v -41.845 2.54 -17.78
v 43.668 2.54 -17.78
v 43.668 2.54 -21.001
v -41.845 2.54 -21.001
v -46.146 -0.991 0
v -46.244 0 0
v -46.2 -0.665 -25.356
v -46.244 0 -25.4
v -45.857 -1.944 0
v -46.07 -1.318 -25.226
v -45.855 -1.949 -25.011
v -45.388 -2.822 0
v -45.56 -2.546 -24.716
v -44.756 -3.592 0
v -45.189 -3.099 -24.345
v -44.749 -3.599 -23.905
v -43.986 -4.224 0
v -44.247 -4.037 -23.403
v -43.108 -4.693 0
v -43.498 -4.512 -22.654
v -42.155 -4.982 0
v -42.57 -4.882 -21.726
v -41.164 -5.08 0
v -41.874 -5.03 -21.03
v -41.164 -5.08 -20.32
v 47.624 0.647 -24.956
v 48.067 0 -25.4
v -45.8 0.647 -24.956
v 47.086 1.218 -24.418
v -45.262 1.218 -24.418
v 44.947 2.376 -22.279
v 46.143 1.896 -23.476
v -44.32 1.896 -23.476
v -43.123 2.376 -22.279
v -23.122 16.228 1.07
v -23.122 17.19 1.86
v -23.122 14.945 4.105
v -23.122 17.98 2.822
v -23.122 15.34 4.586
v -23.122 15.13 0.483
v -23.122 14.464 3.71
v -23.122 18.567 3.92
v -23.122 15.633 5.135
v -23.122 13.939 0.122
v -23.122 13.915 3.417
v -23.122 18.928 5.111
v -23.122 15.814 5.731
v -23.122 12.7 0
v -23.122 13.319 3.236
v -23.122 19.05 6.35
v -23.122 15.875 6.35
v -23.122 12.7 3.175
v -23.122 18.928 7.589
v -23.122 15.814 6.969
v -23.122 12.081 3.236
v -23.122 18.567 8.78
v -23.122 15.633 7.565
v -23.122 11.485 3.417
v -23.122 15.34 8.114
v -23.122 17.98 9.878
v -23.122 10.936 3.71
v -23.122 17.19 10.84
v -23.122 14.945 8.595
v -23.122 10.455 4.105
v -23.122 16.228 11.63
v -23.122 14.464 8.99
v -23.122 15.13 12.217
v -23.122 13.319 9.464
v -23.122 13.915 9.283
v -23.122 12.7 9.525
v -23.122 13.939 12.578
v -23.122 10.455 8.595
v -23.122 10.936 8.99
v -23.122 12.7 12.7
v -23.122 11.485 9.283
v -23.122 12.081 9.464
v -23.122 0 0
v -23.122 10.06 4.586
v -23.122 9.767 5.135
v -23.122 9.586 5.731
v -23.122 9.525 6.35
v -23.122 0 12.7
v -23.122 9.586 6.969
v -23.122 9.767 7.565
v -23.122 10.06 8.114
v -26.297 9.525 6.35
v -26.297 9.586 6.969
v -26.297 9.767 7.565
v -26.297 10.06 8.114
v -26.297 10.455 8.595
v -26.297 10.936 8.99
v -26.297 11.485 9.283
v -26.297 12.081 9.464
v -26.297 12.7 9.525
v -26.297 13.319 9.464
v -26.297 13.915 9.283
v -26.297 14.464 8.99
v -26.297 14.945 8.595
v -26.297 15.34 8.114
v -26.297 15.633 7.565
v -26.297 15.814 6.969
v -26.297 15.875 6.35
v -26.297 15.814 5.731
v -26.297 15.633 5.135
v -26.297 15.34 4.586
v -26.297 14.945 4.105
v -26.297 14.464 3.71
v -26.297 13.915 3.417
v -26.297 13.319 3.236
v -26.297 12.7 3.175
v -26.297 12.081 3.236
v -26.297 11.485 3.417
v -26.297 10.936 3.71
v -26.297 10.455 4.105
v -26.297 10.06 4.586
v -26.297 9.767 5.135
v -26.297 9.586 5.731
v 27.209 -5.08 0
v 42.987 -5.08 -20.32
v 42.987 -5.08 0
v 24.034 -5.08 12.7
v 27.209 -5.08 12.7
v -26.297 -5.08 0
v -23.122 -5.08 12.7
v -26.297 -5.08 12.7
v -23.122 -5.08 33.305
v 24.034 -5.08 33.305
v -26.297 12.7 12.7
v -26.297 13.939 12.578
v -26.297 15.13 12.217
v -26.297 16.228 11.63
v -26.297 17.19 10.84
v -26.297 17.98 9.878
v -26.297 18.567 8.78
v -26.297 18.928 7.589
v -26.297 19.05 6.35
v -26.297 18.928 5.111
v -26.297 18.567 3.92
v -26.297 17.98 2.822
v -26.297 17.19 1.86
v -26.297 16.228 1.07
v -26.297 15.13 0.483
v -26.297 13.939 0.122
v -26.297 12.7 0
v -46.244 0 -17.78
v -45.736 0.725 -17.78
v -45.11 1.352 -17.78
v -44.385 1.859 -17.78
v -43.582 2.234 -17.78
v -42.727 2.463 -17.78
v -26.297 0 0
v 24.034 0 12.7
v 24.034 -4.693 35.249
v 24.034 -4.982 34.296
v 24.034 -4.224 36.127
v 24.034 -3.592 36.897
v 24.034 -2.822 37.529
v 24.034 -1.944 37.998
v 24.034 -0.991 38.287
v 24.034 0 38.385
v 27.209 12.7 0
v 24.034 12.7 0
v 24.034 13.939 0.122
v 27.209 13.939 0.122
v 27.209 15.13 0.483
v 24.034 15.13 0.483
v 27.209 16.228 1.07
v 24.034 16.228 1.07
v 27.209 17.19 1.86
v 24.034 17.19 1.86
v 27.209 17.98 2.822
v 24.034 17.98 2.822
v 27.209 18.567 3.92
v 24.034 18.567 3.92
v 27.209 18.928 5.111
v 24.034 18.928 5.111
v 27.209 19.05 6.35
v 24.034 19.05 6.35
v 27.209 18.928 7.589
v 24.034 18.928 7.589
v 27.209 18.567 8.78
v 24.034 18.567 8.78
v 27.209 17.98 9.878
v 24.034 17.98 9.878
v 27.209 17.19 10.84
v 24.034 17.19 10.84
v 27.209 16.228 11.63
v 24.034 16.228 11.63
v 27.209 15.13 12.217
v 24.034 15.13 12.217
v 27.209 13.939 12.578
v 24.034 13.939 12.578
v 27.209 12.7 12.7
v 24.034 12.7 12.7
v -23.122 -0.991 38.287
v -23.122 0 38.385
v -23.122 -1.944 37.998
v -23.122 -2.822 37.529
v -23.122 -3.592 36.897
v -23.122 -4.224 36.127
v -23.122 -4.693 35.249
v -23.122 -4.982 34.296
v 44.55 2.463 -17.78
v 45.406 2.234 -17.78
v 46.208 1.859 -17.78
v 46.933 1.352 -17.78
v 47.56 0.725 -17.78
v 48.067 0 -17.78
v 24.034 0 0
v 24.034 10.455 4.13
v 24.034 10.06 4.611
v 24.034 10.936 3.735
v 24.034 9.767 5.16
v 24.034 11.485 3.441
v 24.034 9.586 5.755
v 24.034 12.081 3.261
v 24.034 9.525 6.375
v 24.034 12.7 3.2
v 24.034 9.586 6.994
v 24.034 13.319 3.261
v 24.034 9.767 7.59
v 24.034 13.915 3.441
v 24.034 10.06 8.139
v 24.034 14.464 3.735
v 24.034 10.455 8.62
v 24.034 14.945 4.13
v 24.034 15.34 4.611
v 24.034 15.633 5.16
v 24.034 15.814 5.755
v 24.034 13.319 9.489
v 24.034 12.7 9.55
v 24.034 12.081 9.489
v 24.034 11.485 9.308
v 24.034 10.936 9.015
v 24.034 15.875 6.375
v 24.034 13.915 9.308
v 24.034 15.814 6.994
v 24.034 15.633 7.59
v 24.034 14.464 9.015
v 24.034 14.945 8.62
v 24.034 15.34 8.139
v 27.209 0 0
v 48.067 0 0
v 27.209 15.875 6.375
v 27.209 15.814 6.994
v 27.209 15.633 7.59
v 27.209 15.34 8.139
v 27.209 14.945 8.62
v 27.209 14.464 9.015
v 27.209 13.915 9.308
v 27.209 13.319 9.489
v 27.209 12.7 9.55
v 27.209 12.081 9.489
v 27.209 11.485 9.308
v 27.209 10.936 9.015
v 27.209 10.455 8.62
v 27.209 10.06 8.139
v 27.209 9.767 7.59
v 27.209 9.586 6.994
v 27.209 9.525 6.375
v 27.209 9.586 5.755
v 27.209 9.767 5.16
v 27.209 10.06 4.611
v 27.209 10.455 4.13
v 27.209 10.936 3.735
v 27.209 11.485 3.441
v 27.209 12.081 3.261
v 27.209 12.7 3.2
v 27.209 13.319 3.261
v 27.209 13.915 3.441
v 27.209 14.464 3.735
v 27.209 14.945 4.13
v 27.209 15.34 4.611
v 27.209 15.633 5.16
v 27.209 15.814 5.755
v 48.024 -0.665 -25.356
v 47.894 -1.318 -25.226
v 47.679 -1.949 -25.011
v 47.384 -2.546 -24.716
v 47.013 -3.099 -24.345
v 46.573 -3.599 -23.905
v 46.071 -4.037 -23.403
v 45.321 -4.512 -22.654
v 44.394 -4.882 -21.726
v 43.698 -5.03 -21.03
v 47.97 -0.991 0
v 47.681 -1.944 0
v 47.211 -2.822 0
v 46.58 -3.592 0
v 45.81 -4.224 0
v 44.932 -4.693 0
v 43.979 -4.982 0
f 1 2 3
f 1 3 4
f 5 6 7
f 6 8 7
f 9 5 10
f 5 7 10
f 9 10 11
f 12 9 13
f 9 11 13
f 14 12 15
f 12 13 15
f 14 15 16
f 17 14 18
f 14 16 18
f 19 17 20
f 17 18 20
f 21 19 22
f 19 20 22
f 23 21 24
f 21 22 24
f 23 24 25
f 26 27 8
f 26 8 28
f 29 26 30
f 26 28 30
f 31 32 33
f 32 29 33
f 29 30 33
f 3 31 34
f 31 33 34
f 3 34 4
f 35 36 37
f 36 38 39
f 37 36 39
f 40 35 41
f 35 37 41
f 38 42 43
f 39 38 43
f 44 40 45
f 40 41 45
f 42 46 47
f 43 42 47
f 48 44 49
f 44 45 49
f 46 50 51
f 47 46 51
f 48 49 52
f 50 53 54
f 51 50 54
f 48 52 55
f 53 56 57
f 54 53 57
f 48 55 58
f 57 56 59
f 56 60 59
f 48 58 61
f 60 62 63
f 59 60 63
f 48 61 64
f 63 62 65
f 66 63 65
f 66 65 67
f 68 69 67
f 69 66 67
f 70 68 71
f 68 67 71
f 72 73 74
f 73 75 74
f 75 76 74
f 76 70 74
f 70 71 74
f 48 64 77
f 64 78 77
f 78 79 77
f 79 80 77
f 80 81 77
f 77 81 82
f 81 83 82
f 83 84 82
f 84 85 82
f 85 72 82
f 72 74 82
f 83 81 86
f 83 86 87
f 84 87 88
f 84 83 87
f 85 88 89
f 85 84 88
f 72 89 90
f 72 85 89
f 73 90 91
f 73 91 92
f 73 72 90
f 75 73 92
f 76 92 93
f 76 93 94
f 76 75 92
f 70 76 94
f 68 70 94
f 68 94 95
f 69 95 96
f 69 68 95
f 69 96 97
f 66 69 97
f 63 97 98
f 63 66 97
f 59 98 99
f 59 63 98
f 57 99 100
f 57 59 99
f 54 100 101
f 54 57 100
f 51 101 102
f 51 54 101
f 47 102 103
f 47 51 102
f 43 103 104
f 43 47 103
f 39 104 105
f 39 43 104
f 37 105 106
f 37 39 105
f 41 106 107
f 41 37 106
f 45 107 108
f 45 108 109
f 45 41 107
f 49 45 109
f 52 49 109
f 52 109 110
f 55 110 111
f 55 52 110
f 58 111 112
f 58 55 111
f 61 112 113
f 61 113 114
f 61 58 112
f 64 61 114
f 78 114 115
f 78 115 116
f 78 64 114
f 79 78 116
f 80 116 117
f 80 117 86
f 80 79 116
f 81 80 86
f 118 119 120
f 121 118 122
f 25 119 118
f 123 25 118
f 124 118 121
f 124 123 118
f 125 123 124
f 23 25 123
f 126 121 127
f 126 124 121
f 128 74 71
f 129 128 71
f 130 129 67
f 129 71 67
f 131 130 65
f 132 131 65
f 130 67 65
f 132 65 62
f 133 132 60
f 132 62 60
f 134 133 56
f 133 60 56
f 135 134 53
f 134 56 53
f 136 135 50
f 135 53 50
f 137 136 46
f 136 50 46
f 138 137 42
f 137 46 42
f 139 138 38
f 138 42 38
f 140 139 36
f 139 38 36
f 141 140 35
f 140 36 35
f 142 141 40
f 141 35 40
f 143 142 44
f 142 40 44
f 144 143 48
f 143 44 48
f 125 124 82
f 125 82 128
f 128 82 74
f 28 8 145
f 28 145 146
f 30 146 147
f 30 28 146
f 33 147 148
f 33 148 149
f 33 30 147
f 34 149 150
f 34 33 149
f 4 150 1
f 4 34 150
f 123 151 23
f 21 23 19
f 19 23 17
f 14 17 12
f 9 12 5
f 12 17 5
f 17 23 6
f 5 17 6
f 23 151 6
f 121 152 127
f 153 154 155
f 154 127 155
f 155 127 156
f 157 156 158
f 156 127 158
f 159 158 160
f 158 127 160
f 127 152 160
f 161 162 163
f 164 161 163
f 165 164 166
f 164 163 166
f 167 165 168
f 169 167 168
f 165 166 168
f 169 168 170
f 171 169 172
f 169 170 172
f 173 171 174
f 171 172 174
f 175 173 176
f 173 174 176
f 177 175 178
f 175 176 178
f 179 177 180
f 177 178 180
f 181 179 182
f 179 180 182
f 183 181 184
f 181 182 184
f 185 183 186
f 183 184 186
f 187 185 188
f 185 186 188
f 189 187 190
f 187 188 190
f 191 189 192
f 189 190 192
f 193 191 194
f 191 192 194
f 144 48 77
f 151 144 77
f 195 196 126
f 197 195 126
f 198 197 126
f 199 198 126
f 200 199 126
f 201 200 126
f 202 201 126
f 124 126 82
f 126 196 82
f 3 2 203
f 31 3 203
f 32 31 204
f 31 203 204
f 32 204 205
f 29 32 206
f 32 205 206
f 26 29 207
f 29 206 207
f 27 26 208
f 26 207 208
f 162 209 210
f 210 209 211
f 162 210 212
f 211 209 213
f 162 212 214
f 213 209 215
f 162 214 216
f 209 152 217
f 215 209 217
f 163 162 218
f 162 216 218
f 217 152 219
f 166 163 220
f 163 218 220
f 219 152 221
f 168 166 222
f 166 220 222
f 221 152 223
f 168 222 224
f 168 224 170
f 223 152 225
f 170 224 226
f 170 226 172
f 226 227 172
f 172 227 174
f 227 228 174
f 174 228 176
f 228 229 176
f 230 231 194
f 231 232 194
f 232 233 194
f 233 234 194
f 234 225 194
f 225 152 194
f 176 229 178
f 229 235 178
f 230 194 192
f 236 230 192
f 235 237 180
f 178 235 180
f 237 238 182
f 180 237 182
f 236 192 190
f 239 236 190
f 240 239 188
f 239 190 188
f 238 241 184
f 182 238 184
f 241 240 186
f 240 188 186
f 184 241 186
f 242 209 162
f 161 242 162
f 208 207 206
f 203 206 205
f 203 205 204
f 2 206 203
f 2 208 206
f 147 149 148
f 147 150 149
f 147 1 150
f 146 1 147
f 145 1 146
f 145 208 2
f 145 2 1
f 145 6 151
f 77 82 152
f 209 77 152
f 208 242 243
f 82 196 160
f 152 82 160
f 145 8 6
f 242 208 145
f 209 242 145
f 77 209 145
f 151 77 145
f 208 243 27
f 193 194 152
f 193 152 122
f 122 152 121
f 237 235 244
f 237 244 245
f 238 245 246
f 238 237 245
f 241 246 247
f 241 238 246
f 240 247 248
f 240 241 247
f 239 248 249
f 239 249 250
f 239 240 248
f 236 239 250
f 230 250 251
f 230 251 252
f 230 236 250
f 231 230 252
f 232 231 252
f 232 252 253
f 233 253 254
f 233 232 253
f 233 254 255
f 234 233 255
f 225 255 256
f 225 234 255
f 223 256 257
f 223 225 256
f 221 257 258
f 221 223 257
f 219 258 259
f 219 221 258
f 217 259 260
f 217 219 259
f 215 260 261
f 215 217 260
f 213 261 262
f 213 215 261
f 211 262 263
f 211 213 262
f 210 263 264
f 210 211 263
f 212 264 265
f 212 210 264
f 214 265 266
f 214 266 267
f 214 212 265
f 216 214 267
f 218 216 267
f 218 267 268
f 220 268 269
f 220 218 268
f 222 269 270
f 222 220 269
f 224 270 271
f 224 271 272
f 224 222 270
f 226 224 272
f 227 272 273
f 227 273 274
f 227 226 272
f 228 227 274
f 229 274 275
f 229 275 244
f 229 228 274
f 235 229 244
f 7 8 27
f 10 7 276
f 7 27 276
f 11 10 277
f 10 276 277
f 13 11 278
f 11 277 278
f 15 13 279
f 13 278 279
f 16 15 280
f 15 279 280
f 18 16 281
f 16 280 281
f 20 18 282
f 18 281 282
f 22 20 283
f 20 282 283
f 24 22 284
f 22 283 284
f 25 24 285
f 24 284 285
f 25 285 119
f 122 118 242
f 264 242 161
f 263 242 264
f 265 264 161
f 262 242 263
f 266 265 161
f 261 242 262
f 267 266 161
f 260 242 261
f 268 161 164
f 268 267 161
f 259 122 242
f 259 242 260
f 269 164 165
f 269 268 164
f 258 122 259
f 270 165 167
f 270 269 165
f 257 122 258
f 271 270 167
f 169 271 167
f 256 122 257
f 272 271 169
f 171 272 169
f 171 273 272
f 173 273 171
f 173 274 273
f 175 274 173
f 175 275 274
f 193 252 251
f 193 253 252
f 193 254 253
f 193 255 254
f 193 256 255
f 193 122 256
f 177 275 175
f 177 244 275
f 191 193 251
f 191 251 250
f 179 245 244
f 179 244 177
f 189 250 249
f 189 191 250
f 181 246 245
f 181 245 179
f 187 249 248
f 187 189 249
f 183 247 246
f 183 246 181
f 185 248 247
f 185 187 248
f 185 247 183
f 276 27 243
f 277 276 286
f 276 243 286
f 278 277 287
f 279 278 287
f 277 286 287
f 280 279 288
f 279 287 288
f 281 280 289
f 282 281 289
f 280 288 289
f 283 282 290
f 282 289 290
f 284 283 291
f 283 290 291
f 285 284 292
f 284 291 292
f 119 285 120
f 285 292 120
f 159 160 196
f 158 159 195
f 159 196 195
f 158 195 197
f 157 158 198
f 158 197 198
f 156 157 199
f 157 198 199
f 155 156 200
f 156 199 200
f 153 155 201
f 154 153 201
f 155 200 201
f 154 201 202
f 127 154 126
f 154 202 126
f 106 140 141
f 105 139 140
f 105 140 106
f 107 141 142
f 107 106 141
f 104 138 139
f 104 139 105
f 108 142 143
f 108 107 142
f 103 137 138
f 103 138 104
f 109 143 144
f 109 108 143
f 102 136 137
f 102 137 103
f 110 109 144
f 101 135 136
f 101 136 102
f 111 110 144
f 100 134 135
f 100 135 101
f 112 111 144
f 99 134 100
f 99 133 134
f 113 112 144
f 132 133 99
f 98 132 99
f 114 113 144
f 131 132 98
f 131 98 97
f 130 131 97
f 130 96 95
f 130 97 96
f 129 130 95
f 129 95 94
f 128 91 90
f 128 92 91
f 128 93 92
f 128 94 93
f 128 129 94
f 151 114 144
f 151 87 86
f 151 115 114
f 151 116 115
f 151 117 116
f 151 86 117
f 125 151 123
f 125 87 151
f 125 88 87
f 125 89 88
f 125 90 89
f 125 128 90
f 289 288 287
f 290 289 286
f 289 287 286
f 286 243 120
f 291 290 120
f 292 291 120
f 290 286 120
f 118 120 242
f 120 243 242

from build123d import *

# Parameters (mm, degrees)
F1_DEPTH     = 5.08
F2_R         = 5.07999
F3_R         = 3.175
F3_W         = 5.08
F3_H         = 12.7
F4_DEPTH     = 3.175
F5_R         = 3.175
F5_W         = 5.08
F5_H         = 12.7
F6_DEPTH     = 3.175
F7_W         = 94.3114114086
F7_H         = 7.62
F8_DEPTH     = 2.54
F9_T1_DEPTH  = 116.3084855321
F9_T6_DEPTH  = 29.6170741236
F9_T11_DEPTH = 29.6170741236


# Not quite as in the source:
# - a fillet or chamfer that OpenCascade refuses, or shapes differently, is made with other operations: its cross-section is extruded or revolved along the edge and cut away or added
# - a fillet or chamfer is up to 0.001 mm smaller than in the source, because OpenCascade refuses the exact size


with BuildPart() as f1:
    # F0 (on Front) → F1 (new body)
    with BuildSketch(Plane.XZ):
        Polygon((-23.1219715205, 38.3847513186), (-23.1219715205, 0), (-46.243943041, 0), (-46.243943041, -25.4), (48.0674683675, -25.4), (48.0674683675, 0), (24.0337341838, 0), (24.0337341838, 38.3847513186), align=None)
    extrude(amount=F1_DEPTH)

    # F2 (radius 5.08 in the source; OpenCascade refuses exactly that, so slightly less here)
    f2_edges = [f1.edges().sort_by_distance(p)[0] for p in [
        (-46.243943, -5.08, -12.7),
        (48.067468, -5.08, -12.7),
        (0.911763, -5.08, -25.4),
        (0.455881, -5.08, 38.384751),
    ]]
    fillet(f2_edges, radius=F2_R)

    # F3 (on face) → F4 (join)
    with BuildSketch(Plane(origin=(-23.1219715205, 0, 0), x_dir=(0, -1, 0), z_dir=(-1, 0, 0))):
        with BuildLine():
            Line((-12.7, 0), (0, 0))
            Line((0, 0), (0, 12.7))
            Line((0, 12.7), (-12.7, 12.7))
            ThreePointArc((-12.7, 12.7), (-19.05, 6.35), (-12.7, 0))
        make_face()
        with Locations((-12.7, 6.35)):
            Circle(F3_R, mode=Mode.SUBTRACT)
        with Locations((2.54, 6.35)):
            Rectangle(F3_W, F3_H)
    extrude(amount=F4_DEPTH)

    # F5 (on face) → F6 (join)
    with BuildSketch(Plane.YZ.offset(24.0337341838)):
        with BuildLine():
            Line((0, 12.7), (0, 0))
            Line((0, 0), (12.7, 0))
            ThreePointArc((12.7, 0), (19.05, 6.35), (12.7, 12.7))
            Line((12.7, 12.7), (0, 12.7))
        make_face()
        with Locations((12.7, 6.3747640323)):
            Circle(F5_R, mode=Mode.SUBTRACT)
        with Locations((-2.54, 6.35)):
            Rectangle(F5_W, F5_H)
    extrude(amount=F6_DEPTH)

    # F7 (on face) → F8 (join)
    with BuildSketch(Plane(origin=(0, 0, 0), x_dir=(-1, 0, 0), z_dir=(0, 1, 0))):
        with Locations((-0.9117626632, -21.59)):
            Rectangle(F7_W, F7_H)
    extrude(amount=F8_DEPTH)

    # F9: fillet of radius 5.08 on 3 edges, made by hand

    # F9_s2 → F9_t1 (cut)
    with BuildSketch(Plane.YZ.offset(-57.2424801028)):
        with BuildLine():
            ThreePointArc((-1e-05, -25.4), (1.8594061645, -23.5405901753), (2.54, -21.0005851753))
            Line((2.54, -21.0005851753), (2.54, -25.4))
            Line((2.54, -25.4), (-1e-05, -25.4))
        make_face()
    extrude(amount=F9_T1_DEPTH, mode=Mode.SUBTRACT)


with BuildPart() as f9_tool4:
    # F9_s5 → F9_t6 (new body)
    with BuildSketch(Plane.XY.offset(-36.3985370618)):
        with BuildLine():
            ThreePointArc((-46.243943041, -1e-05), (-44.3845332163, 1.8594061645), (-41.8445282163, 2.54))
            Line((-41.8445282163, 2.54), (-46.243943041, 2.54))
            Line((-46.243943041, 2.54), (-46.243943041, -1e-05))
        make_face()
    extrude(amount=F9_T6_DEPTH)

    split(bisect_by=Plane.XZ, keep=Keep.BOTTOM)


with BuildPart() as f1_1:
    add(f1.part)

    # F9_t3: cut F9_tool4
    add(f9_tool4.part, mode=Mode.SUBTRACT)


with BuildPart() as f9_tool9:
    # F9_s10 → F9_t11 (new body)
    with BuildSketch(Plane.XY.offset(-6.7814629382)):
        with BuildLine():
            ThreePointArc((43.6680535428, 2.54), (46.2080585428, 1.8594061645), (48.0674683675, -1e-05))
            Line((48.0674683675, -1e-05), (48.0674683675, 2.54))
            Line((48.0674683675, 2.54), (43.6680535428, 2.54))
        make_face()
    extrude(amount=-F9_T11_DEPTH)

    split(bisect_by=Plane.XZ, keep=Keep.BOTTOM)


with BuildPart() as f1_2:
    add(f1_1.part)

    # F9_t8: cut F9_tool9
    add(f9_tool9.part, mode=Mode.SUBTRACT)


solid = f1_2.part
